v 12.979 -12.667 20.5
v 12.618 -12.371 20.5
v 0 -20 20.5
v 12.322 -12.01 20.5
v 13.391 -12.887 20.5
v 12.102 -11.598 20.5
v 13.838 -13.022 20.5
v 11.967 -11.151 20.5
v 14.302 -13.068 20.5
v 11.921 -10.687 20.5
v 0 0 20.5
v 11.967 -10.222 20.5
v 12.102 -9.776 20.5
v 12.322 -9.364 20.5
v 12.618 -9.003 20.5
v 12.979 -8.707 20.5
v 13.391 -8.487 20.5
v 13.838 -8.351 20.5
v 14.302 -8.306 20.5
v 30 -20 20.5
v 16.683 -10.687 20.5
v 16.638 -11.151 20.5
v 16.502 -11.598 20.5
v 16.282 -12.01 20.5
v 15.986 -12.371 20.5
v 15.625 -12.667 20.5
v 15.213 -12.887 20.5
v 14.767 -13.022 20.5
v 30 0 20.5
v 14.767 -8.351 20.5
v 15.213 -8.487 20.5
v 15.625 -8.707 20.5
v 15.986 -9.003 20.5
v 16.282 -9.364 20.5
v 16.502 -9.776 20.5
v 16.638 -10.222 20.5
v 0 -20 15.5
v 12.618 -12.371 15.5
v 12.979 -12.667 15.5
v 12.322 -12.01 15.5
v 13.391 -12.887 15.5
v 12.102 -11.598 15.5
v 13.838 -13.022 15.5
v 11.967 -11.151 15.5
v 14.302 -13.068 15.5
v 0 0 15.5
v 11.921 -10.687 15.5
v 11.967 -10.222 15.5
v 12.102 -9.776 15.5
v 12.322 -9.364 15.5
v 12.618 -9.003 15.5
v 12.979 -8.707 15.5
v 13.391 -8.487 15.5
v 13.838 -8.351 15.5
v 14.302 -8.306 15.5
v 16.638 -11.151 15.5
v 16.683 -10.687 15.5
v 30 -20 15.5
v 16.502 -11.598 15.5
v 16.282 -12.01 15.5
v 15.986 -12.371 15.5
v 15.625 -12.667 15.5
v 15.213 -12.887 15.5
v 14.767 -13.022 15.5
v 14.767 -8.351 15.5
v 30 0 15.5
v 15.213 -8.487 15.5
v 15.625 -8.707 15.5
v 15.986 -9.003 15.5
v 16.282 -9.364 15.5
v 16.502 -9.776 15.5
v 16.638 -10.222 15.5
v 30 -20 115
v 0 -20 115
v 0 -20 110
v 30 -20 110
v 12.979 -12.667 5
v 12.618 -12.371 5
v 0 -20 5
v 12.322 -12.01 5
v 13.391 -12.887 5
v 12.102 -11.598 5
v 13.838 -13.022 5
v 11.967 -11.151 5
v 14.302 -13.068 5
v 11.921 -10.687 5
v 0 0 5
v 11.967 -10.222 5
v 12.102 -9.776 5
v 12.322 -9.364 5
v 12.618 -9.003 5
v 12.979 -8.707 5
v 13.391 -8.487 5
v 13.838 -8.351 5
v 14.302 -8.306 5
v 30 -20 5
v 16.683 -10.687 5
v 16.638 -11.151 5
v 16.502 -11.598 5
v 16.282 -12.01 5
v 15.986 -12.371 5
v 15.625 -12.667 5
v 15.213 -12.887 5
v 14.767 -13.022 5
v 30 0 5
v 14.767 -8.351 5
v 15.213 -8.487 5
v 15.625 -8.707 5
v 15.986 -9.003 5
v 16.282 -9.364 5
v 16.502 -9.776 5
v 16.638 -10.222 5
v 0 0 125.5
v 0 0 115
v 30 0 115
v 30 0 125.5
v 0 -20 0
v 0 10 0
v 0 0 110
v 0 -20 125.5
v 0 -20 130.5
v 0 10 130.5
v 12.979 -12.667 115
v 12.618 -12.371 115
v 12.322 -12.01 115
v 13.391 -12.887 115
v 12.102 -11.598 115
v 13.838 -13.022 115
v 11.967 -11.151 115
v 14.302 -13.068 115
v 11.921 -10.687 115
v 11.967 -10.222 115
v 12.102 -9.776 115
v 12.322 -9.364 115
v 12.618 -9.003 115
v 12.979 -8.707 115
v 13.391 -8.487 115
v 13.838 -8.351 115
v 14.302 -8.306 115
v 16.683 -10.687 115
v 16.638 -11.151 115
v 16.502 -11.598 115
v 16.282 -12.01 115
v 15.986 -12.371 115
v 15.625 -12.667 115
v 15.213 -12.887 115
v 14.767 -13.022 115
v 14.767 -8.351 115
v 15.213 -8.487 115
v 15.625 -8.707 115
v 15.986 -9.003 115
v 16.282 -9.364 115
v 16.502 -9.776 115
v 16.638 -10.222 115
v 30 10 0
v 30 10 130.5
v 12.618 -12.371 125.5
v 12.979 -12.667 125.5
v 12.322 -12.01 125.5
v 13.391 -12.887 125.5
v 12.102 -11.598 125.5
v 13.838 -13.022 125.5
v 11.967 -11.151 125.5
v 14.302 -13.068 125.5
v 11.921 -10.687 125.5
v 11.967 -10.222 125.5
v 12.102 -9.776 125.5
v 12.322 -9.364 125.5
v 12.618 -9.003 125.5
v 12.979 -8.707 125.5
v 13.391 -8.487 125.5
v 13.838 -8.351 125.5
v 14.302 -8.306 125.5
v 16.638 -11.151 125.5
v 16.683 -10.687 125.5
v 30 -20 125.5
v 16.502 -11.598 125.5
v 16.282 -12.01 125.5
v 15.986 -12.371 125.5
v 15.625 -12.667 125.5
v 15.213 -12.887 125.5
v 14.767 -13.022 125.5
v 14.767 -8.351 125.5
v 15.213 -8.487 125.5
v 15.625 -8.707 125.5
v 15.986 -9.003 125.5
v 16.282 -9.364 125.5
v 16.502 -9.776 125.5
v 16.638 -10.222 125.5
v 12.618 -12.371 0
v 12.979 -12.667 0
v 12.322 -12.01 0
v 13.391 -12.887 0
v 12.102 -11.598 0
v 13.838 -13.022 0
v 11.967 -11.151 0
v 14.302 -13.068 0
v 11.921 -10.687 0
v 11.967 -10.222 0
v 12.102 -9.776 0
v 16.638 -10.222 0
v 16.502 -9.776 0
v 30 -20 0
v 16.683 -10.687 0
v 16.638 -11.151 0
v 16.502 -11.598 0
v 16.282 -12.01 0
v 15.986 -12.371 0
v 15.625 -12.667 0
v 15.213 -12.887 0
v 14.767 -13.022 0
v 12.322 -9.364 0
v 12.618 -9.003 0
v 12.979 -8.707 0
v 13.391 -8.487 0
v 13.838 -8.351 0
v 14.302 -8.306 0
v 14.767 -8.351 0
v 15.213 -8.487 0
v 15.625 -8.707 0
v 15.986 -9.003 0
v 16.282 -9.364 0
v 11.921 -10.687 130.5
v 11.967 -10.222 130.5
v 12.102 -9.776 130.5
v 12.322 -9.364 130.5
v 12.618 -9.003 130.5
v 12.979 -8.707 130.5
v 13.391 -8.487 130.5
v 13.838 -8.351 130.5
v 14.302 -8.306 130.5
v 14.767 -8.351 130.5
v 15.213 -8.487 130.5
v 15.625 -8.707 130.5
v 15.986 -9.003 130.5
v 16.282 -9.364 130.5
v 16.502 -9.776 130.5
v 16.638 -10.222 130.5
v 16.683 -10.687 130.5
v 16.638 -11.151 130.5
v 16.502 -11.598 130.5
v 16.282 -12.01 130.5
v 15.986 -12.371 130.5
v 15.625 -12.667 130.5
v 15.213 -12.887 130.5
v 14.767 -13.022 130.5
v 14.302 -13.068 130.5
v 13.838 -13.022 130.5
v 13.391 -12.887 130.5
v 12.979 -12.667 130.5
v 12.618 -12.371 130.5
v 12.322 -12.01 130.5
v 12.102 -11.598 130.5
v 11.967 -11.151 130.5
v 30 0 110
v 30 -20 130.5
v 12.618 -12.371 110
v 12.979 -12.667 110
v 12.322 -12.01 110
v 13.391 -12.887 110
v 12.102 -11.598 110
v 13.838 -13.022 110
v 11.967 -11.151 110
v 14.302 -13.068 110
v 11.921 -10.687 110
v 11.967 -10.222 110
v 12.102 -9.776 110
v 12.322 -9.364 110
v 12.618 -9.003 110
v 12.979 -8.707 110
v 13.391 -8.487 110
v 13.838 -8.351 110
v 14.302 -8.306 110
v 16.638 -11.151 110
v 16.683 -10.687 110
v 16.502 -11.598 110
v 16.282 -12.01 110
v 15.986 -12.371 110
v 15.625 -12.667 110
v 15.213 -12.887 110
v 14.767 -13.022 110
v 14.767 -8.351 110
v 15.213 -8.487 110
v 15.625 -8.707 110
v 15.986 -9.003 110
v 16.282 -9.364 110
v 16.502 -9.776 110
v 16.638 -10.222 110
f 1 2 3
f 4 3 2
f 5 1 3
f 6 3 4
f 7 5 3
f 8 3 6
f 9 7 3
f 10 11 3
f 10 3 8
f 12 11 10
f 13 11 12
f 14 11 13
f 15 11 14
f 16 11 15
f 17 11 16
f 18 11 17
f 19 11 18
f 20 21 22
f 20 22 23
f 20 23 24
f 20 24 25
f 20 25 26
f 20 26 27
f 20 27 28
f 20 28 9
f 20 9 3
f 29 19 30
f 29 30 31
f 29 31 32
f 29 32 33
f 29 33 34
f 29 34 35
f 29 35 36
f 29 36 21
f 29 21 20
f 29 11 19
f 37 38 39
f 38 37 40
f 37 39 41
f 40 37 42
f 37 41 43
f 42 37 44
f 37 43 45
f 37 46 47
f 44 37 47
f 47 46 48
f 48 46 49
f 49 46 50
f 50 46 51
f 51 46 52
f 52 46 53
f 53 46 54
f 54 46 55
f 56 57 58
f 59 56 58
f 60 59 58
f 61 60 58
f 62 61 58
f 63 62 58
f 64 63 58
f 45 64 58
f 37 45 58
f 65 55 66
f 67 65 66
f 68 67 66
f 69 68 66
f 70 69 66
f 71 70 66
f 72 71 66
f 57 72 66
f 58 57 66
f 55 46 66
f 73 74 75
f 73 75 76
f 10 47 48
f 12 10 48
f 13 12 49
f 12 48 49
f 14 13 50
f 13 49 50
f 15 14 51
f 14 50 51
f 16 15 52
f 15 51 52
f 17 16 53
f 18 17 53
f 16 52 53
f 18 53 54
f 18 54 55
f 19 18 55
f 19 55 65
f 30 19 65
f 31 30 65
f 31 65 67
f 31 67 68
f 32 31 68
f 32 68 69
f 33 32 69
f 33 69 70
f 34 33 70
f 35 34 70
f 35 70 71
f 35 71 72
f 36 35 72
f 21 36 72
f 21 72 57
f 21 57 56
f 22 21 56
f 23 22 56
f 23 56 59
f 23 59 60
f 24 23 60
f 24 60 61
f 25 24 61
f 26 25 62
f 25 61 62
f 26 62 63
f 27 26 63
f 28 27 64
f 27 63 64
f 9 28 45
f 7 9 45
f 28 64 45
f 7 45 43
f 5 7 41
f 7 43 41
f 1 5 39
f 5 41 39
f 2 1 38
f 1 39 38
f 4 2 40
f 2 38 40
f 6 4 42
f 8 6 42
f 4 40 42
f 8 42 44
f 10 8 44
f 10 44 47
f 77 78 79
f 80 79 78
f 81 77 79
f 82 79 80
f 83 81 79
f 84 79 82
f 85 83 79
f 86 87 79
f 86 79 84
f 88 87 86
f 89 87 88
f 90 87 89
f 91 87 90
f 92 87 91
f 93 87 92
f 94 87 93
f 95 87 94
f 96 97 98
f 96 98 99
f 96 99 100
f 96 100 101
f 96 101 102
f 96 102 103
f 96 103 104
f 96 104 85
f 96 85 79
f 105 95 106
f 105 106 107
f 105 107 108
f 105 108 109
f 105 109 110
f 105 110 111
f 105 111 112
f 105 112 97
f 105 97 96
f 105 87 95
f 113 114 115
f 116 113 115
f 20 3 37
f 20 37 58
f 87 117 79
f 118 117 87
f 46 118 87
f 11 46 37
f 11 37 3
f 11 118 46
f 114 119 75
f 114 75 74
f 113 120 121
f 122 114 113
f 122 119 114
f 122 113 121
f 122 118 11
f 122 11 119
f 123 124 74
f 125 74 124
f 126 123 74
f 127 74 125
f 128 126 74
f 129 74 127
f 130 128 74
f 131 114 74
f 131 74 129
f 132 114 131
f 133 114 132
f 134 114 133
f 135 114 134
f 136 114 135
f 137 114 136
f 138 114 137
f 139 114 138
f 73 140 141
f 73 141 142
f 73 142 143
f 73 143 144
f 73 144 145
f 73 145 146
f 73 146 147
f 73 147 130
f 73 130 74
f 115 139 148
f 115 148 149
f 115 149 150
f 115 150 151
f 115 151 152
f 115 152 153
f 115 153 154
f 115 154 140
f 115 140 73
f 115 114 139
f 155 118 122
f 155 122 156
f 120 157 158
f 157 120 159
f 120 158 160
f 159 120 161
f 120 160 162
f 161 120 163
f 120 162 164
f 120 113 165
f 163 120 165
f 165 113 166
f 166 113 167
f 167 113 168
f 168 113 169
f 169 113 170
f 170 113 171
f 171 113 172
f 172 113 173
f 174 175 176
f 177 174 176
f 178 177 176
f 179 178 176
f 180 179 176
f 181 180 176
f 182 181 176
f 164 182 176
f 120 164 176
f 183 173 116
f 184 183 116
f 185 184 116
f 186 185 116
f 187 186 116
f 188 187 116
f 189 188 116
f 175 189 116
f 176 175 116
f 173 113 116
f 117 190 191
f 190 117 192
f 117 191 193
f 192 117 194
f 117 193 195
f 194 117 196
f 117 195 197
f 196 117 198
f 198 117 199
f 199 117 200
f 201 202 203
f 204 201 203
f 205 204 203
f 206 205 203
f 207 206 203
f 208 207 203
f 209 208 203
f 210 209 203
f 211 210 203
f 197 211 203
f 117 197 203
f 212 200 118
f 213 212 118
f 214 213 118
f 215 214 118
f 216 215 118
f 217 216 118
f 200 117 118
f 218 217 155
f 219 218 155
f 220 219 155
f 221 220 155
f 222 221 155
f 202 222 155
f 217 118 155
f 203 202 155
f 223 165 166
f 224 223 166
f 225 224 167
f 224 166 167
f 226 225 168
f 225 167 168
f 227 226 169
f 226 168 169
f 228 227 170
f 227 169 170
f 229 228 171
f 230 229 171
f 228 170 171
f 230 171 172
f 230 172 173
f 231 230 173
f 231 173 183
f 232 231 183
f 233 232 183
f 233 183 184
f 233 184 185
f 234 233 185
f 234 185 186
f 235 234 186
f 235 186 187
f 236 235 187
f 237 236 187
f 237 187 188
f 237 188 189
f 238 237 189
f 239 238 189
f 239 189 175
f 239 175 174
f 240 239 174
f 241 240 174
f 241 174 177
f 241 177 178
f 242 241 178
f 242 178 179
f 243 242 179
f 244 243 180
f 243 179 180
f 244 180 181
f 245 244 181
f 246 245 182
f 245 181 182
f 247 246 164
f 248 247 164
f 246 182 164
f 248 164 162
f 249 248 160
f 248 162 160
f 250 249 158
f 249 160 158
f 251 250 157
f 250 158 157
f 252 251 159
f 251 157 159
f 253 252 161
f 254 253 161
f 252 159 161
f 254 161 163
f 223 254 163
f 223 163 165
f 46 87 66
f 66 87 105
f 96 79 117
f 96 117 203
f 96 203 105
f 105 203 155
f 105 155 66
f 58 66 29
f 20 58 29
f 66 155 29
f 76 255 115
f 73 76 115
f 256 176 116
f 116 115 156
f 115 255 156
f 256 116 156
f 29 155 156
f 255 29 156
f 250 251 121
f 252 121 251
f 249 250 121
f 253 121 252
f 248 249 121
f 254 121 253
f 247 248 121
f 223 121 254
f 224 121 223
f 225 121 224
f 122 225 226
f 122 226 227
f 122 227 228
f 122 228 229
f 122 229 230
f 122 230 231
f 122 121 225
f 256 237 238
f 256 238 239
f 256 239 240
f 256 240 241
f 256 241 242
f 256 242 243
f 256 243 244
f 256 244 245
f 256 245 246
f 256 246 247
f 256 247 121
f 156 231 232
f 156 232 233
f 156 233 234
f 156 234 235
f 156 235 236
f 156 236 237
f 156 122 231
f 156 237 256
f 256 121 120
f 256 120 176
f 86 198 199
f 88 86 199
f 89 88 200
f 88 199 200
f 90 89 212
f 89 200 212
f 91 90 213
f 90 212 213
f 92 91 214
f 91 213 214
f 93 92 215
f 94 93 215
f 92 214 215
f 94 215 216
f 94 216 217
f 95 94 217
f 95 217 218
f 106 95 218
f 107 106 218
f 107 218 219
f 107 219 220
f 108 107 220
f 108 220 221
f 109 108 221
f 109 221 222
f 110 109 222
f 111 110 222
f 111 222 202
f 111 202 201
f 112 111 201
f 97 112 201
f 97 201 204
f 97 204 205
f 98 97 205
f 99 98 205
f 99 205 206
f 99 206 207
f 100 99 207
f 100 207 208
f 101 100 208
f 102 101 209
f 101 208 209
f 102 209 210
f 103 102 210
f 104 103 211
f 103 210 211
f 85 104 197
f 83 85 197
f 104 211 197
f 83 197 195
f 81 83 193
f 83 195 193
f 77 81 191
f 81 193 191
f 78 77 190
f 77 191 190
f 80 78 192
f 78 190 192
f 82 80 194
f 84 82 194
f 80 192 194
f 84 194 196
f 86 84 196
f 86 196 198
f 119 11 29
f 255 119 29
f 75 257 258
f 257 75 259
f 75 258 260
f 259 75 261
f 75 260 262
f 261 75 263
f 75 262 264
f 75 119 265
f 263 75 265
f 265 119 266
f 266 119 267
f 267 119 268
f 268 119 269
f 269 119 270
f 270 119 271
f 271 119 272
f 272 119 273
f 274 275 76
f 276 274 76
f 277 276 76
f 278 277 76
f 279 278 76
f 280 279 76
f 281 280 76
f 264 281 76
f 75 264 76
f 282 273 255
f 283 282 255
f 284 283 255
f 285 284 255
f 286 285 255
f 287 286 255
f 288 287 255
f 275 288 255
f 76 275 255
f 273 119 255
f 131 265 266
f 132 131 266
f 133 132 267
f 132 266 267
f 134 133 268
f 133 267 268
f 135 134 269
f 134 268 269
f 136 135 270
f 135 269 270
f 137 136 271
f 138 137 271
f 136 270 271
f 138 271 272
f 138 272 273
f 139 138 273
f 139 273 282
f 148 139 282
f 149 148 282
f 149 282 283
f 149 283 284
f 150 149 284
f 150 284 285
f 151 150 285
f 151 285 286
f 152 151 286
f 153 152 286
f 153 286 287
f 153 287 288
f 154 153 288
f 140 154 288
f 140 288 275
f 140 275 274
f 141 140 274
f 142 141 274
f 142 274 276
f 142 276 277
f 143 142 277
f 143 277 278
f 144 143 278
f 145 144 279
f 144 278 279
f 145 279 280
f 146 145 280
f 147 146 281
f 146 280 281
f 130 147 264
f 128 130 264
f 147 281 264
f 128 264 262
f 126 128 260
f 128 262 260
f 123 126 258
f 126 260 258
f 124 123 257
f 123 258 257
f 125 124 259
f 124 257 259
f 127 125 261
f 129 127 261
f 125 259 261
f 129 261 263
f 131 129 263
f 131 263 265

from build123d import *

# Parameters (mm, degrees)
ESQUISSE1_W                             = 30
ESQUISSE1_H                             = 10
BOSS_EXTRU_1_DEPTH                      = 130.5
ESQUISSE2_W                             = 30
ESQUISSE2_H                             = 5
BOSS_EXTRU_2_DEPTH                      = 20
PER_AGE_POUR_CROUS_AUTO_BLOQUANTS_300_D = 4.7625


with BuildPart() as part:
    # Esquisse1 → Boss.-Extru.1 (new body)
    with BuildSketch(Plane.XY):
        with Locations((15, 5)):
            Rectangle(ESQUISSE1_W, ESQUISSE1_H)
    extrude(amount=BOSS_EXTRU_1_DEPTH)

    # Esquisse2 → Boss.-Extru.2 (add)
    with BuildSketch(Plane.XZ):
        with Locations((15, 2.5)):
            Rectangle(ESQUISSE2_W, ESQUISSE2_H)
        with Locations((15, 18)):
            Rectangle(ESQUISSE2_W, ESQUISSE2_H)
        with Locations((15, 128)):
            Rectangle(ESQUISSE2_W, ESQUISSE2_H)
        with Locations((15, 112.5)):
            Rectangle(ESQUISSE2_W, ESQUISSE2_H)
    extrude(amount=BOSS_EXTRU_2_DEPTH)

    # Perçage pour écrous auto-bloquants 300® #6 (SP)1 (through all)
    with Locations(Plane.XY.offset(130.5)):
        with Locations((14.302143115, -10.686909811)):
            Hole(PER_AGE_POUR_CROUS_AUTO_BLOQUANTS_300_D / 2)


solid = part.part
